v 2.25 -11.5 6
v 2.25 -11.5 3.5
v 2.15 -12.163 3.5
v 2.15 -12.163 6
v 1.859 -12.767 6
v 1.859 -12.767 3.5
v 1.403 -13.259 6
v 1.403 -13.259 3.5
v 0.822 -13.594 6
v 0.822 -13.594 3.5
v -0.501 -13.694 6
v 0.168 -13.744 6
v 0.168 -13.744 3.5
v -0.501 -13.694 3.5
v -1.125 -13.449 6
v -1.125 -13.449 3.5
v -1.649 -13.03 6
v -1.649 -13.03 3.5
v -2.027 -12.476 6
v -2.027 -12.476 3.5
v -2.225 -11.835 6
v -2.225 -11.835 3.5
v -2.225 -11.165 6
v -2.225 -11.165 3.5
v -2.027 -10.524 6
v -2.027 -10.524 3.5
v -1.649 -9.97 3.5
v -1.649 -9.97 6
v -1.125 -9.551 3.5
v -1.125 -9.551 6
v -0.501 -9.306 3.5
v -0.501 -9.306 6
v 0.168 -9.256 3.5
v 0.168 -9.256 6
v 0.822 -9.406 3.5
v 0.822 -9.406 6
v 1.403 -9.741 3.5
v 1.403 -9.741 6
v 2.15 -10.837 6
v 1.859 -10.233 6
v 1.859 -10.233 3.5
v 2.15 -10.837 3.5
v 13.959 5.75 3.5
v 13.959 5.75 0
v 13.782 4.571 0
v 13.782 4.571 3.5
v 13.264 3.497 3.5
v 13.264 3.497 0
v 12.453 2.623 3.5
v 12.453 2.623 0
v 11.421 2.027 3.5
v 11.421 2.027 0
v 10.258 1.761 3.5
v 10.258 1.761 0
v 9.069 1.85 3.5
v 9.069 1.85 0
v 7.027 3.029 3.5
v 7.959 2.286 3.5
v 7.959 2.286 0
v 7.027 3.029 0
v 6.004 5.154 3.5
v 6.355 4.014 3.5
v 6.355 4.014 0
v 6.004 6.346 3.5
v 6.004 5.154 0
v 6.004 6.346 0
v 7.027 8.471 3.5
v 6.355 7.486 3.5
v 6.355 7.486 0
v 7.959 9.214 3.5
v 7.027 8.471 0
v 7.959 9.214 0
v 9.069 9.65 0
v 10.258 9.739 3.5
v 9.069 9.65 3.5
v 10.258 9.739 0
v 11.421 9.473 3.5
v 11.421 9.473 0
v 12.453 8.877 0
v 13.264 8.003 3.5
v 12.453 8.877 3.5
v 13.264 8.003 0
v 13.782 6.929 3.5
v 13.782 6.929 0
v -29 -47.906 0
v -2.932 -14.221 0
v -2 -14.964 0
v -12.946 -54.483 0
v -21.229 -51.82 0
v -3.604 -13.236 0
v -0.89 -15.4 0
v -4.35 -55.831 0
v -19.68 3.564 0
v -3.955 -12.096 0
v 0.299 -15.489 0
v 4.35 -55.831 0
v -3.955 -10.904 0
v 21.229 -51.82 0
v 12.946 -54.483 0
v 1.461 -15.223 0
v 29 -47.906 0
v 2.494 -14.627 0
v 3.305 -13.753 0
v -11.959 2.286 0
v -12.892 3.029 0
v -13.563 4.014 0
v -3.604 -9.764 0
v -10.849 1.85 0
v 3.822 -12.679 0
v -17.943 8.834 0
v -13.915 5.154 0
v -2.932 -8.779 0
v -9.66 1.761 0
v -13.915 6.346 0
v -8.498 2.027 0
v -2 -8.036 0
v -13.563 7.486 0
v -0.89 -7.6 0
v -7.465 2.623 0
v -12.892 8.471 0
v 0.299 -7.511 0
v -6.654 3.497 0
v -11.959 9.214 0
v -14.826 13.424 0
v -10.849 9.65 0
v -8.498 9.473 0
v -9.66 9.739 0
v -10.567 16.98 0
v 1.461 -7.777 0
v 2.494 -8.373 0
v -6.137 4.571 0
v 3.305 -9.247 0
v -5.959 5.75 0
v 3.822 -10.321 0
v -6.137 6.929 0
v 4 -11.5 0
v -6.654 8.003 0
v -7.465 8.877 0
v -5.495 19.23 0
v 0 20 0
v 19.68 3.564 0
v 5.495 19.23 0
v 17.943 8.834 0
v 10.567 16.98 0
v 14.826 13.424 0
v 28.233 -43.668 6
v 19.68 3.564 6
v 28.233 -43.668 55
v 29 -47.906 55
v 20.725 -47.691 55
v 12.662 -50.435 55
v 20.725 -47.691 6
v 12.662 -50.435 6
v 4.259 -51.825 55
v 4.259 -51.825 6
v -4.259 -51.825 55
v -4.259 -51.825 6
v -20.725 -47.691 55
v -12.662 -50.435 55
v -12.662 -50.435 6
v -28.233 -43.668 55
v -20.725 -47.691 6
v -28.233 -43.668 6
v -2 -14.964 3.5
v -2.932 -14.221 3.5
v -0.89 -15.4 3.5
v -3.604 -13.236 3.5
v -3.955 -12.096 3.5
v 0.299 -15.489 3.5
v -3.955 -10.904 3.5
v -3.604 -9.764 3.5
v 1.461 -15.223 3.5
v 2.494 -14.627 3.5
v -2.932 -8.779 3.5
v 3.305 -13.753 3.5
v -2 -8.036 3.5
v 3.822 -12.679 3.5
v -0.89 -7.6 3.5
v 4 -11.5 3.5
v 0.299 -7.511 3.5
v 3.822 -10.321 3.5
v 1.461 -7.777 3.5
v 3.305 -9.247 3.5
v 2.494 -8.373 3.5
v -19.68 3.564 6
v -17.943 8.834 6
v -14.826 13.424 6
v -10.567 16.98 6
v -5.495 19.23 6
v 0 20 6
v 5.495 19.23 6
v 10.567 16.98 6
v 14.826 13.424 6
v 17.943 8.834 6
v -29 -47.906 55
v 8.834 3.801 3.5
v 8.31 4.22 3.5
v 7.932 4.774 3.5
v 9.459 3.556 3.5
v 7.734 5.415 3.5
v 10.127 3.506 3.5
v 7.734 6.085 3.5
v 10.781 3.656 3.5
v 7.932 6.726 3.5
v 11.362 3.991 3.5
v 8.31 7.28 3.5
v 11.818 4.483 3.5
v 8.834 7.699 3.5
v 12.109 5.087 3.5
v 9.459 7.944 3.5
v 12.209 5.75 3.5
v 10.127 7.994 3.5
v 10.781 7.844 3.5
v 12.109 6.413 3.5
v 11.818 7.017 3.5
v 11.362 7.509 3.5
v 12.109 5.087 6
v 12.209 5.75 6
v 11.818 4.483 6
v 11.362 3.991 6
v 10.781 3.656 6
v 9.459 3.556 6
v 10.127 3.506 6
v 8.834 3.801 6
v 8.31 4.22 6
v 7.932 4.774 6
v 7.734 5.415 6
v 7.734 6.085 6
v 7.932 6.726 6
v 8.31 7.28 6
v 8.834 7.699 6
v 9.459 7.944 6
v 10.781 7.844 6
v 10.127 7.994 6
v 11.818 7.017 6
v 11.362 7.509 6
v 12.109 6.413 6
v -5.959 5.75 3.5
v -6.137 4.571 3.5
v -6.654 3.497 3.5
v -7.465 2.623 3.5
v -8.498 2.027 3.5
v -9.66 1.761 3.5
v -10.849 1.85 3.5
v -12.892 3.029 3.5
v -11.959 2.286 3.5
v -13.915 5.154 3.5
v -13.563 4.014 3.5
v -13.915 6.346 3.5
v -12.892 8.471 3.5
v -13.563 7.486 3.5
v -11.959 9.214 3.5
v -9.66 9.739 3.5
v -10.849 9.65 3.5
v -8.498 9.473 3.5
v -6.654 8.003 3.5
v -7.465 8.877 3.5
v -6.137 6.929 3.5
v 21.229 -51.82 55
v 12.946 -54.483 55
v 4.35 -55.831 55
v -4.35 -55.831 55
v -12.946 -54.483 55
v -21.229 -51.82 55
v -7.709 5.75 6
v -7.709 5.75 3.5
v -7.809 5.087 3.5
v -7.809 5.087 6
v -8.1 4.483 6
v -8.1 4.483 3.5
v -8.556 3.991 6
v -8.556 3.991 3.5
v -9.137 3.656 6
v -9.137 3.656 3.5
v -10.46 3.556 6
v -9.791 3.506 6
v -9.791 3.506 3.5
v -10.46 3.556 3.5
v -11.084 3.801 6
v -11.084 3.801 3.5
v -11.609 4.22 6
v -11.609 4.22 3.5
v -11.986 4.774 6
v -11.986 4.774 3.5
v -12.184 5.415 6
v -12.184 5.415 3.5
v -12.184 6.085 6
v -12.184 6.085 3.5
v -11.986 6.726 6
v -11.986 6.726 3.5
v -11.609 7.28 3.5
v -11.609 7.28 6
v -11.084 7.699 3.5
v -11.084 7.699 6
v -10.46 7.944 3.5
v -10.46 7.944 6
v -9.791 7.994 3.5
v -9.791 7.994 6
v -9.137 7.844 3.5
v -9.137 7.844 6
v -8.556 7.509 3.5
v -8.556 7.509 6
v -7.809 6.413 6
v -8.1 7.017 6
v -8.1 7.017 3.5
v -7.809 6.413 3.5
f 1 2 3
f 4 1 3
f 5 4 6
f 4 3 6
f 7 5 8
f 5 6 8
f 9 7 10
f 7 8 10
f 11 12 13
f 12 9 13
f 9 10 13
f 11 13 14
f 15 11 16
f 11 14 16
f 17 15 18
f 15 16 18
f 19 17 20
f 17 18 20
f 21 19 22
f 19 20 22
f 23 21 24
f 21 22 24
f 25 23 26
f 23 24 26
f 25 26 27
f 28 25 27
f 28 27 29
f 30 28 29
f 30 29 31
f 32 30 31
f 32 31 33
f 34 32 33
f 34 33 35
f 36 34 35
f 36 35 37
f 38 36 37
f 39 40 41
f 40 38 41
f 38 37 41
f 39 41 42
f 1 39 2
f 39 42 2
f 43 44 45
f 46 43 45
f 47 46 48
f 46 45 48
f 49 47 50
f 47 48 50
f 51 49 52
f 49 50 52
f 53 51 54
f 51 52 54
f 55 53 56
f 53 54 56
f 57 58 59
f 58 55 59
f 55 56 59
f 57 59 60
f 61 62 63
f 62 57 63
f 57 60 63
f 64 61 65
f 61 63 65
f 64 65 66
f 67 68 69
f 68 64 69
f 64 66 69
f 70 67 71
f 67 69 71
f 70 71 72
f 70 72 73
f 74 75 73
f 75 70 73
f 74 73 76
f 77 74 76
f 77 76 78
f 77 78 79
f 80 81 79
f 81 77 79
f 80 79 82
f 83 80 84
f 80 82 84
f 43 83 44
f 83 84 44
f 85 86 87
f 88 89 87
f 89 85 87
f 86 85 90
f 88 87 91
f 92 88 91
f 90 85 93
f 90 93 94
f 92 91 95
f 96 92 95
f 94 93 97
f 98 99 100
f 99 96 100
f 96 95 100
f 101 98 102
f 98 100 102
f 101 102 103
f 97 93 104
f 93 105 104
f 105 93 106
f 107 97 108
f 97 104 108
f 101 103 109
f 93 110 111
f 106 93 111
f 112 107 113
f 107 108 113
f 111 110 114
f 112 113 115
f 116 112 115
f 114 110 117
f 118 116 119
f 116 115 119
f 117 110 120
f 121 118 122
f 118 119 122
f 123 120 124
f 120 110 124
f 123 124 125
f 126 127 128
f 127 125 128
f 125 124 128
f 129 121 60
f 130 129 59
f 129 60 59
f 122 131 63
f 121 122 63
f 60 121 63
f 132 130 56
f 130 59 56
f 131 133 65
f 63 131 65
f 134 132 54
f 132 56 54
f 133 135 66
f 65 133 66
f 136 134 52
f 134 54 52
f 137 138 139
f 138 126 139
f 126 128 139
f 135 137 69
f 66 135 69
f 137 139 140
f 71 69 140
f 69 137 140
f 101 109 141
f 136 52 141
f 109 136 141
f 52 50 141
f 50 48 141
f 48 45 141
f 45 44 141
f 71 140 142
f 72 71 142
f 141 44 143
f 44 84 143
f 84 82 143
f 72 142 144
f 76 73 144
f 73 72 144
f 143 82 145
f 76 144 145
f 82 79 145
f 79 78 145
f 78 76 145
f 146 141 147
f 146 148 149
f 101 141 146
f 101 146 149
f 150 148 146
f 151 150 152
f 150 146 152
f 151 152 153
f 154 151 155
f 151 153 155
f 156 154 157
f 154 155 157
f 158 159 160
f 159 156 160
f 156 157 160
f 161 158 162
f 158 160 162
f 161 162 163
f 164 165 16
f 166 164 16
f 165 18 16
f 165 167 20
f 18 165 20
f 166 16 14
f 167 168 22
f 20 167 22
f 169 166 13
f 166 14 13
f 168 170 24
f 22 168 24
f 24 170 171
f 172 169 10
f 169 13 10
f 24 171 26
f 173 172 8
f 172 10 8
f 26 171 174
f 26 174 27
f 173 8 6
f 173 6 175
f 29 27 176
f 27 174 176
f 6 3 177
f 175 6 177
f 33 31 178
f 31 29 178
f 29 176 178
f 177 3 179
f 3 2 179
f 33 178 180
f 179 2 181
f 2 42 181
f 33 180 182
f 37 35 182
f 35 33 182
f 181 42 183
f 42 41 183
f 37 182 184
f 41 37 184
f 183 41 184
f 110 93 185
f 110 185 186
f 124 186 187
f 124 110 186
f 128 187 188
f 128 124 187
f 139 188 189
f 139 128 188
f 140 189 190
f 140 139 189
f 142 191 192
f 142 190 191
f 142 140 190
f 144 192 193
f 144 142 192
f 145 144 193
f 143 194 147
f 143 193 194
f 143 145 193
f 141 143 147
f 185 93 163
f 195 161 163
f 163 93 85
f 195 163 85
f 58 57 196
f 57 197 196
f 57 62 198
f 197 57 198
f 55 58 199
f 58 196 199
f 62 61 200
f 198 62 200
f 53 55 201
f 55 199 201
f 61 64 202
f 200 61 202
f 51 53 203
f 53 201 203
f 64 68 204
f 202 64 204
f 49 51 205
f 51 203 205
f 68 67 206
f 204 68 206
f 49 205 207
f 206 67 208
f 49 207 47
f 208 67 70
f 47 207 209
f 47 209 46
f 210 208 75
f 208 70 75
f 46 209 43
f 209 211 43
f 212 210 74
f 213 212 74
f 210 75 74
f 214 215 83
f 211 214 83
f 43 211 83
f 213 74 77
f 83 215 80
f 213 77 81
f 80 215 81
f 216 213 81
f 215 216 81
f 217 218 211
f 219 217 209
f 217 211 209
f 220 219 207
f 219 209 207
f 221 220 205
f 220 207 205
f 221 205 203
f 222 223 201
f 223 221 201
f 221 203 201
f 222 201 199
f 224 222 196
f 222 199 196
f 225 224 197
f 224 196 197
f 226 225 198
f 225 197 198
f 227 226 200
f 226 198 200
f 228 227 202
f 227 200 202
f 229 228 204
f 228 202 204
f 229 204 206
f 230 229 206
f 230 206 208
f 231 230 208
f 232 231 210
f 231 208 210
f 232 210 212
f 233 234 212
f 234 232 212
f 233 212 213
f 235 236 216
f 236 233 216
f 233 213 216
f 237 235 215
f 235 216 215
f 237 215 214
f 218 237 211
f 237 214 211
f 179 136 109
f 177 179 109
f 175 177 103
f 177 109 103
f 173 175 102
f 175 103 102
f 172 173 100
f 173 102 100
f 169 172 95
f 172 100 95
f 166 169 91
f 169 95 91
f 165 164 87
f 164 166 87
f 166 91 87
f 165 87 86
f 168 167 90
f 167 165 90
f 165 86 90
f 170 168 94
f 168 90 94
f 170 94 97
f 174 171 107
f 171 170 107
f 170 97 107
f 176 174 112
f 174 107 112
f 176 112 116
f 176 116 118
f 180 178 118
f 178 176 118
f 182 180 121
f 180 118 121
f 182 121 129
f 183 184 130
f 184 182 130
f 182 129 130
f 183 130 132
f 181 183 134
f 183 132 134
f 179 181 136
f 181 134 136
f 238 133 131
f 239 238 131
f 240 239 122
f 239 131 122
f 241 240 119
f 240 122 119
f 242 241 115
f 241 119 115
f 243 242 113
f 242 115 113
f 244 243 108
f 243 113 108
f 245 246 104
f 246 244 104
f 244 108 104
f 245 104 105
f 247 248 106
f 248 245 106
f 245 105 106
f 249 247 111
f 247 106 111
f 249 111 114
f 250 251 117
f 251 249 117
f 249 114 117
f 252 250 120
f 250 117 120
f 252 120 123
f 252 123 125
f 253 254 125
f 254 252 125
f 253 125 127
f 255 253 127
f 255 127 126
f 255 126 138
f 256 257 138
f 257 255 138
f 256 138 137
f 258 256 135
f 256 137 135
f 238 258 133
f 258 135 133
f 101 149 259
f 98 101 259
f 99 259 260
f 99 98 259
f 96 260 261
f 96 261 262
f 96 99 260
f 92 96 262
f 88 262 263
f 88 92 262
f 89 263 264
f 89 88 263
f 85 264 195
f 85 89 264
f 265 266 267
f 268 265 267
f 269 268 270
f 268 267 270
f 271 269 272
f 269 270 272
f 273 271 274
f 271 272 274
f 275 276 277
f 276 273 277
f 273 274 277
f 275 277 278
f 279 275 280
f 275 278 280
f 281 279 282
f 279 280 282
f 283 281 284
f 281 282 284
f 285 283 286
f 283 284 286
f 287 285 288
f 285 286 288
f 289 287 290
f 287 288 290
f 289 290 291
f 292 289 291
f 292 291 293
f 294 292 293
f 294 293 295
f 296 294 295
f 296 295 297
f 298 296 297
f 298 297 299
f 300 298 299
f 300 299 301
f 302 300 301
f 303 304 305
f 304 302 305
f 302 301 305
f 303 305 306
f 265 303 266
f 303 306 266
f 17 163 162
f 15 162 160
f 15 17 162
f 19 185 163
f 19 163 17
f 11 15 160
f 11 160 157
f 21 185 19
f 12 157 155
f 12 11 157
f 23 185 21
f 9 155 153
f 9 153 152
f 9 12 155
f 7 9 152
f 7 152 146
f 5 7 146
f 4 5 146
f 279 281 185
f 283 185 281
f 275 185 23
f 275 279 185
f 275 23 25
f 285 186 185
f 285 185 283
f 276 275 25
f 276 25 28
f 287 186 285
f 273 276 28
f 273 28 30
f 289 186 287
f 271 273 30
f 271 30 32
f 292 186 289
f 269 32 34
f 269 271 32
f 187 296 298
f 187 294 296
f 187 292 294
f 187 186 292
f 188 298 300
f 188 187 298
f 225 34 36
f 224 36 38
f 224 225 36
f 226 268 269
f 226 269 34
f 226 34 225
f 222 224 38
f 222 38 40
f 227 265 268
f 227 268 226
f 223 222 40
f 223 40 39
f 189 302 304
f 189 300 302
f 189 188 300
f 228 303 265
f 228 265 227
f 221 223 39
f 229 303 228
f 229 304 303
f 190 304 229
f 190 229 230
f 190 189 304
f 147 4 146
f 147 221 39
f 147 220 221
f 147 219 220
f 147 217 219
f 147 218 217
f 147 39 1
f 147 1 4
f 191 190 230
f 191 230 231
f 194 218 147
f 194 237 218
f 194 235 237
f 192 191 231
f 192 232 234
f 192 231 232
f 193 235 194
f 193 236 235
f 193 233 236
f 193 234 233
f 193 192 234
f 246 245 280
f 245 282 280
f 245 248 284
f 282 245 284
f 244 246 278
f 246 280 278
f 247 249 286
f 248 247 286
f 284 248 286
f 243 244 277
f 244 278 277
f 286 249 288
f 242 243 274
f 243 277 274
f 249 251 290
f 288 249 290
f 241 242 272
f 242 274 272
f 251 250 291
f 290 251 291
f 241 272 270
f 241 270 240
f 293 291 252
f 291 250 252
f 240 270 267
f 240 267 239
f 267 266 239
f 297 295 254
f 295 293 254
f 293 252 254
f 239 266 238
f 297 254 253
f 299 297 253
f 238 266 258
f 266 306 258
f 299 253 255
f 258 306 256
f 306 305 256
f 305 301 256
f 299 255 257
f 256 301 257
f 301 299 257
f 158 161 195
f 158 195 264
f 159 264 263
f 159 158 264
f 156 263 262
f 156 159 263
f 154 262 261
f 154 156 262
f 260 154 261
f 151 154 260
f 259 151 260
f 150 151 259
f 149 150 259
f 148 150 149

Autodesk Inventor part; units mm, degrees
ref_plane "YZ Plane" through (0, 0, 0) normal (1, 0, 0) x (0, 1, 0)
ref_plane "XZ Plane" through (0, 0, 0) normal (0, 1, 0) x (-1, 0, 0)
ref_plane "XY Plane" through (0, 0, 0) normal (0, 0, 1) x (1, 0, 0)
sketch "Sketch1" plane through (0, 0, 0) normal (0, 0, 1) x (1, 0, 0)
  circle A0 centre (0, 0) radius 20
  line L0 (-19.68, 3.5636) -> (-29, -47.9062)
  line L1 (19.68, 3.5636) -> (29, -47.9062)
  line L2 (9.9593, -5.75) -> (0, 0) construction
  circle A1 centre (8.4134, -4.8575) radius 2.5
  line L3 (0, 0) -> (9.9593, 5.75) construction
  line L4 (0, 0) -> (-9.9593, -5.75) construction
  circle A2 centre (-8.4134, -4.8575) radius 2.5
  circle A3 centre (0, 0) radius 9.715 construction
  circle A4 centre (0, 0) radius 11.5 construction
  circle A5 centre (0, 9.715) radius 2.5
  line L5 (0, 0) -> (-9.9593, 5.75) construction
  line L6 (11.5, 0) -> (-11.5, 0) construction
  circle A6 centre (-9.9593, 5.75) radius 4
  circle A7 centre (-9.9593, 5.75) radius 2.25
  line L7 (0, -48.5721) -> (0, 22.5) construction
  circle A8 centre (0, -11.5) radius 2.25
  circle A9 centre (0, -11.5) radius 4
  circle A10 centre (9.9593, 5.75) radius 4
  circle A11 centre (9.9593, 5.75) radius 2.25
  arc A12 (-28.2326, -43.6683) -> (28.2326, -43.6683) centre (0, 0) ccw
  arc A13 (-29, -47.9062) -> (29, -47.9062) centre (0, 0) ccw
  line L8 (8, -59.5) -> (-8, -59.5)
  line L9 (-8, -59.5) -> (-8, -52.5)
  line L10 (-8, -52.5) -> (8, -52.5)
  line L11 (8, -52.5) -> (8, -59.5)
  line L12 (8, -59.5) -> (-8, -52.5) construction
  line L13 (-8, -59.5) -> (8, -52.5) construction
  point P0 (0, 11.4686)
  point P1 (0, 11.4686)
  point P2 (11.5, 0)
  point P3 (-11.5, 0)
  point P4 (0, -56)
  dimension "d18" = 23
  dimension "d0" = 40
  dimension "d17" = 19.43
  dimension "d19" = 30
  dimension "d20" = 30
  dimension "d21" = 4.5
  dimension "d22" = 8
  dimension "d23" = 5
  dimension "d24" = 104
  dimension "d25" = 112
  dimension "d48" = 58
  dimension "d60" = 16
  dimension "d61" = 7
  dimension "d40" = 14
  dimension "d41" = 50
  dimension "d50" = 25
  dimension "d51" = 35
  dimension "d52" = 2.5
  dimension "d53" = 4
extrude "Extrusion1" add sketch "Sketch1" along normal blind 6 contours A0 | A0 L1 A12 L0 | L1 A13 L11 L10 L9 L0 A12 | A13 L9 L10 L11 | A1 | A2 | A5 | A6 | A9 | A10
extrude "Extrusion2" cut sketch "Sketch1" along normal blind 3.5 contours A6 | A9 | A10 | A11
extrude "Extrusion4" add sketch "Sketch1" along normal blind 49 from surface at 6 contours L1 A13 L11 L10 L9 L0 A12 | A13 L9 L10 L11
properties part number "thigh_hip_connector"
